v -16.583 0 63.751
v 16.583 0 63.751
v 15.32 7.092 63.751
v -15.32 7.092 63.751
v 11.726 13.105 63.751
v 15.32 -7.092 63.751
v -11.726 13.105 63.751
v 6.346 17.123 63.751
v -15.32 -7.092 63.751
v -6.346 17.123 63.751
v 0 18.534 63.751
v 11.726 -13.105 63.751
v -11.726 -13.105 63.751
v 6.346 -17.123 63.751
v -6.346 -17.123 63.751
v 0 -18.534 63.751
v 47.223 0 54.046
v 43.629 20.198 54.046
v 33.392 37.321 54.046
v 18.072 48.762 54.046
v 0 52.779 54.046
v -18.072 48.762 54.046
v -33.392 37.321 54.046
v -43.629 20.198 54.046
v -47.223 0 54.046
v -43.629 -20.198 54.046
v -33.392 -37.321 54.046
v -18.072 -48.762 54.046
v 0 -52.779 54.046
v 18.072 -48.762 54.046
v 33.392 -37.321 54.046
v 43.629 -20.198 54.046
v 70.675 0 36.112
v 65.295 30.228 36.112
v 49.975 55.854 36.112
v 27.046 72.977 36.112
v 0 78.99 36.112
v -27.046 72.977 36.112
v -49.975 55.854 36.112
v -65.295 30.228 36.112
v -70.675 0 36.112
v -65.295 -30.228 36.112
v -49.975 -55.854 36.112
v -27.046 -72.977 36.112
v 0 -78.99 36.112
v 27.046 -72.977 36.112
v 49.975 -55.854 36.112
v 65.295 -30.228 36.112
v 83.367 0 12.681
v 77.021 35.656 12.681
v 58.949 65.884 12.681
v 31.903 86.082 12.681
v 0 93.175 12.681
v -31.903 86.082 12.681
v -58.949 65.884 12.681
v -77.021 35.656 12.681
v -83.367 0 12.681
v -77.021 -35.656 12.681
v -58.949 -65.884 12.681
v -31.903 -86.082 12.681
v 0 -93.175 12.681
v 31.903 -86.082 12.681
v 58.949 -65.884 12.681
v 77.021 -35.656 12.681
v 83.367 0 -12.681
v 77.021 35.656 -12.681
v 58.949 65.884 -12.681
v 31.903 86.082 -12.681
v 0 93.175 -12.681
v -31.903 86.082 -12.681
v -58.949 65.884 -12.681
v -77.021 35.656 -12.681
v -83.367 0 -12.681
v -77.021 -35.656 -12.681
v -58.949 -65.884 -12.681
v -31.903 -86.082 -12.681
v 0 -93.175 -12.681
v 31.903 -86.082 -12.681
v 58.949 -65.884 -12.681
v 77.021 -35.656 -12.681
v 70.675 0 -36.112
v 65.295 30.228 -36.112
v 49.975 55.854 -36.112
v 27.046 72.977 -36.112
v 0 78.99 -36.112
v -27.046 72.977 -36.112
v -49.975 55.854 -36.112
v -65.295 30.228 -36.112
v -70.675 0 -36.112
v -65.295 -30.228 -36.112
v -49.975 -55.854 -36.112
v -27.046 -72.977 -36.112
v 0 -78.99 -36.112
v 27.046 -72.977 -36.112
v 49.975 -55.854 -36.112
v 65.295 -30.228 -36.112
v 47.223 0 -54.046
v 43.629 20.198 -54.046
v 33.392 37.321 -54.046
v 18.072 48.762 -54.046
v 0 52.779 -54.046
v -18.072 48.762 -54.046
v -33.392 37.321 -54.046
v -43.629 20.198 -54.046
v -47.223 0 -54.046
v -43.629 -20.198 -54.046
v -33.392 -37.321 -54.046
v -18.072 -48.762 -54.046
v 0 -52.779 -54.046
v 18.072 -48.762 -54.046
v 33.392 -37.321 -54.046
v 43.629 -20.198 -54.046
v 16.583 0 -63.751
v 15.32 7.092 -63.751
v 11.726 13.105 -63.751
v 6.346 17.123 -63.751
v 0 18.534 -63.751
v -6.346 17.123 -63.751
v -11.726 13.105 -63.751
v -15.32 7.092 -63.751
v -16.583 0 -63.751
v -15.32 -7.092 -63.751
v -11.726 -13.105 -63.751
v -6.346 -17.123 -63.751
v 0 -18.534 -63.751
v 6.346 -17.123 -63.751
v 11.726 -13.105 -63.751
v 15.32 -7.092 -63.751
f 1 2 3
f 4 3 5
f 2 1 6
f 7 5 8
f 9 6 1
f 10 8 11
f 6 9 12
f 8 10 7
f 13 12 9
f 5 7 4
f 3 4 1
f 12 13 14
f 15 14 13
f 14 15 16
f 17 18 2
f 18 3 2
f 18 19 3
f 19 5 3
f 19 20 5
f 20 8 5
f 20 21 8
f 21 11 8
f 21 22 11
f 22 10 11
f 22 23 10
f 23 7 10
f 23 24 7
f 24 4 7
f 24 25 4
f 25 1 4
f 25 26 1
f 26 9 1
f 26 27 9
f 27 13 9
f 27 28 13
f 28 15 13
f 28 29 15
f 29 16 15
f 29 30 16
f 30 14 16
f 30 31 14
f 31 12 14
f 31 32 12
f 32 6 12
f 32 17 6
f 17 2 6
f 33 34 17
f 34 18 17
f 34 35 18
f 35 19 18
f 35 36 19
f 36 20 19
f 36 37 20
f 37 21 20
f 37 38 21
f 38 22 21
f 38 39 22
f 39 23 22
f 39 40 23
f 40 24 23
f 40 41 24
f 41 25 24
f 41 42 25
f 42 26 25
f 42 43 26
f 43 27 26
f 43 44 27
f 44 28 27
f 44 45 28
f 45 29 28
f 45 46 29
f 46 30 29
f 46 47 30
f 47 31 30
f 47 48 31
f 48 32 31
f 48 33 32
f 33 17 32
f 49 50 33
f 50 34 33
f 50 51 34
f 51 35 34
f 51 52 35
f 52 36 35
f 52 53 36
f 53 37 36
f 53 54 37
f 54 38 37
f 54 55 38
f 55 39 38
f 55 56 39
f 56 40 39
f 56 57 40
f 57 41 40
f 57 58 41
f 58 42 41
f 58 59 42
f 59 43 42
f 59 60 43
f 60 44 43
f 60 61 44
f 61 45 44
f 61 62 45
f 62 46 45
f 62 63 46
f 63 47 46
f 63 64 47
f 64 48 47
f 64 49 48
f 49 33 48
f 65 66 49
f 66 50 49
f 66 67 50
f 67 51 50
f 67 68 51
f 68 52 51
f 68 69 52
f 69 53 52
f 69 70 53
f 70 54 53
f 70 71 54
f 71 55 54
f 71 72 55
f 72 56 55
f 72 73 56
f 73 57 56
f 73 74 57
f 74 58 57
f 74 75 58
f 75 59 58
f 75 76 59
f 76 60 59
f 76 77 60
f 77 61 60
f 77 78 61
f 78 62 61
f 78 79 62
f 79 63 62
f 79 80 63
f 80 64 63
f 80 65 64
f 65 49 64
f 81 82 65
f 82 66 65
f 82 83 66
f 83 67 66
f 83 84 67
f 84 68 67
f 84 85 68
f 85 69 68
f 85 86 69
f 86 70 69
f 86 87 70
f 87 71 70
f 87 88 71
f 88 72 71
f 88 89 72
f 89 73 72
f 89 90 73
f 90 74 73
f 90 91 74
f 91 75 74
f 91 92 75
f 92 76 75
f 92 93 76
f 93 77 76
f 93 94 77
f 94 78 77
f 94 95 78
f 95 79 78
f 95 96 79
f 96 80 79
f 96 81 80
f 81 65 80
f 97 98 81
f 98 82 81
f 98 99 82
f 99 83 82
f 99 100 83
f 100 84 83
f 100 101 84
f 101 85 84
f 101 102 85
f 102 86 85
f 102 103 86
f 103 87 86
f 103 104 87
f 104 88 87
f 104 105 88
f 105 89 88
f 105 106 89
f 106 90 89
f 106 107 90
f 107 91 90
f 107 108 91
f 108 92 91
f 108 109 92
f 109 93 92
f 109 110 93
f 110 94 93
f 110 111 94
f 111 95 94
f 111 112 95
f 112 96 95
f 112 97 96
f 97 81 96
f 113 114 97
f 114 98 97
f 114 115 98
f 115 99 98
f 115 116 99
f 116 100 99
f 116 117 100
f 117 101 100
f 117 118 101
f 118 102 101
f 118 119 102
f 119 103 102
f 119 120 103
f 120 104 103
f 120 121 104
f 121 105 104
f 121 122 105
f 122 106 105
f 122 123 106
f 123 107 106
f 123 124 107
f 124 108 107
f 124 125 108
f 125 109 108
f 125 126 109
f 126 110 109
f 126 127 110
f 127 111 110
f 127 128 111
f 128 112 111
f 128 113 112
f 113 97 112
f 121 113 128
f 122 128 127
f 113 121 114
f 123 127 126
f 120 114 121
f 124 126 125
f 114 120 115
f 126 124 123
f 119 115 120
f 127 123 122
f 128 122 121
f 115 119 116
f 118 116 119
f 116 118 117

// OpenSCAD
// Generated by SolidPython 1.0.1 on 2020-07-29 00:46:53


scale(v = [17, 19, 13]) {
	sphere(r = 5);
}
/***********************************************
*********      SolidPython code:      **********
************************************************
 
# import packages: SolidPython
from solid import *
from solid.utils import *
from itertools import chain, combinations, permutations


class Resize:

    def __init__(self, scad_file):
        self.scad_file = scad_file
        #self.scad_file = import_scad(scad_file)
        # cone/cylinder param:
        self.r1 = 0
        self.r2 = 0
        self.h = 0
        # rectangular prism param:
        self.w = 0
        self.l = 0
        # ellipse param:
        self.r = 0

    # import OpenScad code (file name corresponds to shape)


    # classify shape + parameters
    def assign(self, param1, param2, param3):
        if self.scad_file == 'cone.scad':
            self.r1 = param1
            self.r2 = param2
            self.h = param3
        elif self.scad_file == 'cylinder.scad':
            self.r1 = param1
            self.r2 = param2
            self.h = param3
        elif self.scad_file == 'rectangularPrism.scad':
            self.h = param1
            self.l = param2
            self.w = param3
        else:
            self.r = param1
            self.h = param2

    # resize parameters
    def iterate(self):
        x = range(3, 20, 2)
        i = 1
        if self.scad_file == 'cone.scad':
            tempList = list(permutations(x, 2))
            for temp in tempList:
                param1 = temp[0]
                param2 = temp[1]
                filepath = 'produced_scad_files/' + 'cone' + str(param1) + '_' + str(param2) + '_' + '.scad'
                scad_render_to_file(cylinder(h=param1, r1=param2, r2=0), filepath)

        elif self.scad_file == 'cylinder.scad':
            tempList = list(permutations(x, 3))
            for temp in tempList:
                param1 = temp[0]
                param2 = temp[1]
                filepath = 'produced_scad_files/' + 'cylinder' + str(param1) + '_' + str(param2) + '_' + '.scad'
                scad_render_to_file(cylinder(h=param1, r1=param2, r2=param2), filepath)

        elif self.scad_file == 'rectangularPrism.scad':
            tempList = list(permutations(x, 3))
            for temp in tempList:
                param1 = temp[0]
                param2 = temp[1]
                param3 = temp[2]
                filepath = 'produced_scad_files/' + 'rectangularPrism' + str(param1) + '_' + str(param2) + '_' + str(
                    param3) + '.scad'
                scad_render_to_file(cube(size=(param1, param2, param3)), filepath)

        elif self.scad_file == 'ellipse.scad':
            tempList = list(permutations(x, 4))
            for temp in tempList:
                param1 = temp[0]
                param2 = temp[1]
                param3 = temp[2]
                param4 = temp[3]
                filepath = 'produced_scad_files/' + 'ellipse' + str(param1) + '_' + str(param2) + '_' + str(param3) + '_' + str(param4) + '.scad'
                scad_render_to_file(scale([param1, param2, param3])(sphere(r=param4)), filepath)

    def render_to_scadfile(self):
        scad_render_to_file(scad, 'example.scad') 
 
************************************************/
